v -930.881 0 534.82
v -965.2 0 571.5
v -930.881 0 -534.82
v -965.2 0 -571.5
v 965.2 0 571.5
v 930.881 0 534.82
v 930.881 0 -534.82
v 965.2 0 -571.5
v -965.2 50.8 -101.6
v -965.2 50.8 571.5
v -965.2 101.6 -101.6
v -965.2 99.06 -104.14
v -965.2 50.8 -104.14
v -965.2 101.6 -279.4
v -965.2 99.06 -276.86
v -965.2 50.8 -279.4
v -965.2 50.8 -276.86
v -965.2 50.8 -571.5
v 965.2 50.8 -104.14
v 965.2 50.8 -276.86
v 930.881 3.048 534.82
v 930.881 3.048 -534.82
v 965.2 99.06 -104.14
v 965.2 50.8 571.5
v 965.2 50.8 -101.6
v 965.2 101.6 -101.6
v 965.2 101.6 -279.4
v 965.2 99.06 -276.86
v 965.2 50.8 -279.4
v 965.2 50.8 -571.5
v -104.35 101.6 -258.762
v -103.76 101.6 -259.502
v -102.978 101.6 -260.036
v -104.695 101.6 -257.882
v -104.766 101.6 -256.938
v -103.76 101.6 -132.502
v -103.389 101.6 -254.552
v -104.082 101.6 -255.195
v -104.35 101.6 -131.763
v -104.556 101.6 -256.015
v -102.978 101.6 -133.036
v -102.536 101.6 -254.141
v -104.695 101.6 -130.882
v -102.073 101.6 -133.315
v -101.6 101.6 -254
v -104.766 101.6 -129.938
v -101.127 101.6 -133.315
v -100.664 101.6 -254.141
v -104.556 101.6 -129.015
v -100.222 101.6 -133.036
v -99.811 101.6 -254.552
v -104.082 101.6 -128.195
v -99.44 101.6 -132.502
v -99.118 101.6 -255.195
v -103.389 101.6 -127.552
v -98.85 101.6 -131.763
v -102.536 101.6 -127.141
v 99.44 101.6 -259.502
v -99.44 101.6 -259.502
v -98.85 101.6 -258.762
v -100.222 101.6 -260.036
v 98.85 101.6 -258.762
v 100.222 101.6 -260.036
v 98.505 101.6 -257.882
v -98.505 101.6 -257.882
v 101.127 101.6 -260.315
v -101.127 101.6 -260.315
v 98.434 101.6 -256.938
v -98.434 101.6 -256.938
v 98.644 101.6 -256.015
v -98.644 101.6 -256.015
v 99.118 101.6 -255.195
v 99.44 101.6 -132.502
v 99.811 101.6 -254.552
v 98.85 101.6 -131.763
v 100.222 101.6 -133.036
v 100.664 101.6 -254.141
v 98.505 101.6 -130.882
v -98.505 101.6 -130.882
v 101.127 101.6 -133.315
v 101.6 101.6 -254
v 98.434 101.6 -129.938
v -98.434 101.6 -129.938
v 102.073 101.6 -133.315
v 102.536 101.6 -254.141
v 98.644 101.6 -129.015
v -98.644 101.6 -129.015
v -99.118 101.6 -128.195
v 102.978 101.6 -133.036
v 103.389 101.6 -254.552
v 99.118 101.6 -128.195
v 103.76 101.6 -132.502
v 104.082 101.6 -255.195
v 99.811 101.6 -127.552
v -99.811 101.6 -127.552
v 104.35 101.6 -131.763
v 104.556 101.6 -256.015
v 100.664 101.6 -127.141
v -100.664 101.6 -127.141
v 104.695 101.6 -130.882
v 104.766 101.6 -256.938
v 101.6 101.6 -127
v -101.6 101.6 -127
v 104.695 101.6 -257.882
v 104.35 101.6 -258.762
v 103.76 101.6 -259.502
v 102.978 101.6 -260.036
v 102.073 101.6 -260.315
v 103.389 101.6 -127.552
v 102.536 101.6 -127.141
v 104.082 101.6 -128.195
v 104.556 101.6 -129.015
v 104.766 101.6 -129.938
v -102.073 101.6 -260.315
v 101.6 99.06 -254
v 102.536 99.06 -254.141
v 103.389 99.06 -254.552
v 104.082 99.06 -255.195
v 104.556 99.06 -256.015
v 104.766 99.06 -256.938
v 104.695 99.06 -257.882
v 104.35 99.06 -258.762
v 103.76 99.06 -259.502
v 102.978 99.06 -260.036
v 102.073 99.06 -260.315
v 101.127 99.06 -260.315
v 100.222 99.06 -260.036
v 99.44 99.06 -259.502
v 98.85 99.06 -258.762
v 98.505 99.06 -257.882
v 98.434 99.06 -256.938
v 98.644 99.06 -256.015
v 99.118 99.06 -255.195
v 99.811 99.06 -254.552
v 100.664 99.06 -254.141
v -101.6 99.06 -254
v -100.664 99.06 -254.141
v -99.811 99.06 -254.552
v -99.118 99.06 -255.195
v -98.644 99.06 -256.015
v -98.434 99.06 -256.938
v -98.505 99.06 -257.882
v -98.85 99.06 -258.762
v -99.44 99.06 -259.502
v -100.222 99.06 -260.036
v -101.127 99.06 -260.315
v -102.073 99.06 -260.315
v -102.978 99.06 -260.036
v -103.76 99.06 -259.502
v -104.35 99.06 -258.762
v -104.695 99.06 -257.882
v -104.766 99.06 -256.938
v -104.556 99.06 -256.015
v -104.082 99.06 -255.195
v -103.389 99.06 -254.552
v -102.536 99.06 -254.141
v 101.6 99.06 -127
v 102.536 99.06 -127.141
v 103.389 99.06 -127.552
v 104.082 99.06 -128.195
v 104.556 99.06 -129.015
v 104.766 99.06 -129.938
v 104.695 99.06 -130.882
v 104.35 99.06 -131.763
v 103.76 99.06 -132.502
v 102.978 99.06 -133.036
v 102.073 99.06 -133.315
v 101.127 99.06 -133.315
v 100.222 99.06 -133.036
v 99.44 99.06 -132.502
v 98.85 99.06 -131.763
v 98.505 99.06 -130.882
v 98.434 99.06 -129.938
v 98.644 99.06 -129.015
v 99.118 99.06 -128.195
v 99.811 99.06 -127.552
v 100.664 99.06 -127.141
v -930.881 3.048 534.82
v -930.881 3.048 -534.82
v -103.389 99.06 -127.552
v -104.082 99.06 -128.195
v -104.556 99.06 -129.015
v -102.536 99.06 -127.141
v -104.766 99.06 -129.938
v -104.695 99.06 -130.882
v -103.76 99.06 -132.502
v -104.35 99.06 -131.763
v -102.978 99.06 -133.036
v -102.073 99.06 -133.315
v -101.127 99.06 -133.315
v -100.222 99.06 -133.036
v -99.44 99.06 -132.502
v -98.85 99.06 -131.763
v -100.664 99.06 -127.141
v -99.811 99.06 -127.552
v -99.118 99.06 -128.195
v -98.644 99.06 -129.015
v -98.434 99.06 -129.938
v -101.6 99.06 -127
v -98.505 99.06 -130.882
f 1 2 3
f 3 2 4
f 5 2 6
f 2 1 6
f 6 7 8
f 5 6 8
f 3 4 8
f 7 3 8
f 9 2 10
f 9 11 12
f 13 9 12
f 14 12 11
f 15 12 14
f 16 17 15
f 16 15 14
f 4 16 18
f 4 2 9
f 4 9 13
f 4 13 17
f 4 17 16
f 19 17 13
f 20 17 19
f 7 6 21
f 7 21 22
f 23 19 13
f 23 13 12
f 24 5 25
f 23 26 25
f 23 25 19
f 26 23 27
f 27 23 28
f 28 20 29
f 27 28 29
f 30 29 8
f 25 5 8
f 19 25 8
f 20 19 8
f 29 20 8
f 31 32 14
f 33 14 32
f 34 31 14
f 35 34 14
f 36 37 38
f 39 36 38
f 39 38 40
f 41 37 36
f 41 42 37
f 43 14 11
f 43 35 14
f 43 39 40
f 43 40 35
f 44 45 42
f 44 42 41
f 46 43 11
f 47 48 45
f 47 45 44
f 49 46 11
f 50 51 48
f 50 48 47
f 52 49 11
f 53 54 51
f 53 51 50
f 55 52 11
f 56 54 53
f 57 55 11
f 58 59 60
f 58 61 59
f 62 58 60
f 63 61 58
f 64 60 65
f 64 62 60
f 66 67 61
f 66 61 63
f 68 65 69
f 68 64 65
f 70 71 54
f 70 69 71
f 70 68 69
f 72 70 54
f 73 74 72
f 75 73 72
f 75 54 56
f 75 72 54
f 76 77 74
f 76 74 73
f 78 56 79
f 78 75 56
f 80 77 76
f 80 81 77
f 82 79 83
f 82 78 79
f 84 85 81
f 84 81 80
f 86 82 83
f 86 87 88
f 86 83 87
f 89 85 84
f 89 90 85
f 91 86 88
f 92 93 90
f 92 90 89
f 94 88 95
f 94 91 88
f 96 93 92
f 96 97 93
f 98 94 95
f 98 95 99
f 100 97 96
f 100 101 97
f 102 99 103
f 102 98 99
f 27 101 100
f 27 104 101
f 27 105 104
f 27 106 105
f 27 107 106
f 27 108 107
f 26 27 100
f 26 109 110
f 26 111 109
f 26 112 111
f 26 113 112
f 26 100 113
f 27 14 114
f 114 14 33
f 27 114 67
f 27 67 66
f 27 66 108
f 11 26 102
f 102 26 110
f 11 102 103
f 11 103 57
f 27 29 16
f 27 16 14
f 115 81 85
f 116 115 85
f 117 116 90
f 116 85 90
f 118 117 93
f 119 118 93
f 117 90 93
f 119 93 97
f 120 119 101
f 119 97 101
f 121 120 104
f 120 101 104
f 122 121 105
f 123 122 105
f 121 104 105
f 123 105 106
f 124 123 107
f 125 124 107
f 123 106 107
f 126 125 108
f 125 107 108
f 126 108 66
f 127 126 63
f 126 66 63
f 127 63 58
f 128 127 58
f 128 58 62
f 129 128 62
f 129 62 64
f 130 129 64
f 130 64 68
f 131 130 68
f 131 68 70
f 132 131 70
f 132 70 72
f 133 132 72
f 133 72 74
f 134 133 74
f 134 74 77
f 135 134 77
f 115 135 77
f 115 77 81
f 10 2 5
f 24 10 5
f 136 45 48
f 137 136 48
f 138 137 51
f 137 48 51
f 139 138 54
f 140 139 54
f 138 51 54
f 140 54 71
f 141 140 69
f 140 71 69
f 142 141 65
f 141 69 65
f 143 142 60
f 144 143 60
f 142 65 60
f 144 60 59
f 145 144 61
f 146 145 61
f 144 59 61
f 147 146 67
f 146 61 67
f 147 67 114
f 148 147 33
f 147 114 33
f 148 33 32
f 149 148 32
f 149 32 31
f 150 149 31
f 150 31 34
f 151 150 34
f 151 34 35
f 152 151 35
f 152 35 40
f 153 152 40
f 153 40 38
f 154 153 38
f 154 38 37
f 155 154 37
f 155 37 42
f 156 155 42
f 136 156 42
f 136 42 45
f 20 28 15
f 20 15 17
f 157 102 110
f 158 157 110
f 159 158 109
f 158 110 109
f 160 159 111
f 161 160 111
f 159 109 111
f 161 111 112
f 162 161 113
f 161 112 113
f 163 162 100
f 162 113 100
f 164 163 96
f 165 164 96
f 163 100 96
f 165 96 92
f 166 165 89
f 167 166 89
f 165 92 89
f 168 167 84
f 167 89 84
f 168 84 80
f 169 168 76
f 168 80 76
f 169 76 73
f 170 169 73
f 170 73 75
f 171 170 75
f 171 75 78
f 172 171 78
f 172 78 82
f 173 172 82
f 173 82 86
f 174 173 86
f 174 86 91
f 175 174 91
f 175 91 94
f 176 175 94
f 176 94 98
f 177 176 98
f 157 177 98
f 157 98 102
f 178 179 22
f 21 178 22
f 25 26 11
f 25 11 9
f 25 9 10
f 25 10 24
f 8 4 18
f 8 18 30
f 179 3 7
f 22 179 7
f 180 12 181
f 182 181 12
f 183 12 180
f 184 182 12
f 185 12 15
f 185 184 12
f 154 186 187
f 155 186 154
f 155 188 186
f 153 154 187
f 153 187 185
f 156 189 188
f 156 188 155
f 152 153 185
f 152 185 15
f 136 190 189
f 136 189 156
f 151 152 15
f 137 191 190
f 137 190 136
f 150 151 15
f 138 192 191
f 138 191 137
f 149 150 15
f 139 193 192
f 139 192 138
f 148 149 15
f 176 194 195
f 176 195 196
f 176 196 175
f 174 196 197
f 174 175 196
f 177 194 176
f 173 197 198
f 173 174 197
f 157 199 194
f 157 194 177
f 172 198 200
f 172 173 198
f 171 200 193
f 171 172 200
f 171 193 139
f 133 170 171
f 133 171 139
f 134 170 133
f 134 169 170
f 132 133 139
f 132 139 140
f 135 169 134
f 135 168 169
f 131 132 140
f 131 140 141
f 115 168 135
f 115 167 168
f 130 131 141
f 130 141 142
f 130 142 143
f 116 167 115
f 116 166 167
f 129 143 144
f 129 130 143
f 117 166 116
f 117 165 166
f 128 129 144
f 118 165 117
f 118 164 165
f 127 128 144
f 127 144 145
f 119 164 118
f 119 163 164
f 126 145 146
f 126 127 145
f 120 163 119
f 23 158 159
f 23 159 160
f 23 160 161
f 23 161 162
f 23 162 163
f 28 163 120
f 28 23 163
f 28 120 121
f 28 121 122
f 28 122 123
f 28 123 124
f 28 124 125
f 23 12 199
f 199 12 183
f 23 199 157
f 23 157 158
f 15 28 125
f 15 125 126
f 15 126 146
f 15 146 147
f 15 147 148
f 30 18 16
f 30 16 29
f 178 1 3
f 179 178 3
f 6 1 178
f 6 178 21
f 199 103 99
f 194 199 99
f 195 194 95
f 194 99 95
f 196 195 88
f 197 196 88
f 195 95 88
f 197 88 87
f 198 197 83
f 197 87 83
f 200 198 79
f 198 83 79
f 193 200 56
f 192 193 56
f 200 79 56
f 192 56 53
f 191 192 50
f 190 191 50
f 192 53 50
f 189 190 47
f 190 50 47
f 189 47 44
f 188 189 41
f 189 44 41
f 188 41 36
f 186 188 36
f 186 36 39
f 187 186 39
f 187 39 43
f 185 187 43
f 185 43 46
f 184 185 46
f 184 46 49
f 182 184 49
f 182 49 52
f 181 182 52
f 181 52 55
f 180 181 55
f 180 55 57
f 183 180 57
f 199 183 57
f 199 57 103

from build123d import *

# Parameters (mm, degrees)
SKETCH1_W           = 1930.4
SKETCH1_H           = 1143
BOSS_EXTRUDE1_DEPTH = 50.8
SKETCH2_W           = 1861.76231229
SKETCH2_H           = 1069.640341316
CUT_EXTRUDE1_DEPTH  = 3.048
BOSS_EXTRUDE3_DEPTH = 1930.4
CUT_EXTRUDE2_REACH  = 1128.297
SKETCH4_R           = 3.175


with BuildPart() as part:
    # Sketch1 → Boss-Extrude1 (new body)
    with BuildSketch(Plane(origin=(0, 0, 0), x_dir=(1, 0, 0), z_dir=(0, 1, 0))):
        Rectangle(SKETCH1_W, SKETCH1_H)
    extrude(amount=BOSS_EXTRUDE1_DEPTH)

    # Sketch2 → Cut-Extrude1 (cut)
    with BuildSketch(Plane(origin=(0, 0, 0), x_dir=(1, 0, 0), z_dir=(0, 1, 0))):
        Rectangle(SKETCH2_W, SKETCH2_H)
    extrude(amount=CUT_EXTRUDE1_DEPTH, mode=Mode.SUBTRACT)

    # Sketch3 → Boss-Extrude3 (add, through all)
    with BuildSketch(Plane(origin=(965.2, 0, 0), x_dir=(0, 0, -1), z_dir=(1, 0, 0))):
        Polygon((101.6, 50.8), (104.14, 50.8), (104.14, 99.06), (276.86, 99.06), (276.86, 50.8), (279.4, 50.8), (279.4, 101.6), (101.6, 101.6), align=None)
    extrude(amount=-BOSS_EXTRUDE3_DEPTH)

    # Sketch4 → Cut-Extrude2 (cut, up to next)
    with BuildSketch(Plane(origin=(0, 101.6, 0), x_dir=(1, 0, 0), z_dir=(0, 1, 0)), mode=Mode.PRIVATE) as cut_extrude2_sk1:
        with Locations(Location((101.6, 130.175, 0), (0, 0, 270))):
            Circle(SKETCH4_R)
    cut_extrude2_tool1 = extrude(cut_extrude2_sk1.sketch, amount=-CUT_EXTRUDE2_REACH, mode=Mode.PRIVATE) & part.part
    # Sketch4 → Cut-Extrude2 (cut, up to next)
    with BuildSketch(Plane(origin=(0, 101.6, 0), x_dir=(1, 0, 0), z_dir=(0, 1, 0)), mode=Mode.PRIVATE) as cut_extrude2_sk2:
        with Locations(Location((-101.6, 130.175, 0), (0, 0, 270))):
            Circle(SKETCH4_R)
    cut_extrude2_tool2 = extrude(cut_extrude2_sk2.sketch, amount=-CUT_EXTRUDE2_REACH, mode=Mode.PRIVATE) & part.part
    # Sketch4 → Cut-Extrude2 (cut, up to next)
    with BuildSketch(Plane(origin=(0, 101.6, 0), x_dir=(1, 0, 0), z_dir=(0, 1, 0)), mode=Mode.PRIVATE) as cut_extrude2_sk3:
        with Locations(Location((-101.6, 257.175, 0), (0, 0, 270))):
            Circle(SKETCH4_R)
    cut_extrude2_tool3 = extrude(cut_extrude2_sk3.sketch, amount=-CUT_EXTRUDE2_REACH, mode=Mode.PRIVATE) & part.part
    # Sketch4 → Cut-Extrude2 (cut, up to next)
    with BuildSketch(Plane(origin=(0, 101.6, 0), x_dir=(1, 0, 0), z_dir=(0, 1, 0)), mode=Mode.PRIVATE) as cut_extrude2_sk4:
        with Locations(Location((101.6, 257.175, 0), (0, 0, 270))):
            Circle(SKETCH4_R)
    cut_extrude2_tool4 = extrude(cut_extrude2_sk4.sketch, amount=-CUT_EXTRUDE2_REACH, mode=Mode.PRIVATE) & part.part
    add(cut_extrude2_tool1.solids().sort_by_distance((101.6, 101.6, -130.175))[0], mode=Mode.SUBTRACT)
    add(cut_extrude2_tool2.solids().sort_by_distance((-101.6, 101.6, -130.175))[0], mode=Mode.SUBTRACT)
    add(cut_extrude2_tool3.solids().sort_by_distance((-101.6, 101.6, -257.175))[0], mode=Mode.SUBTRACT)
    add(cut_extrude2_tool4.solids().sort_by_distance((101.6, 101.6, -257.175))[0], mode=Mode.SUBTRACT)


solid = part.part
